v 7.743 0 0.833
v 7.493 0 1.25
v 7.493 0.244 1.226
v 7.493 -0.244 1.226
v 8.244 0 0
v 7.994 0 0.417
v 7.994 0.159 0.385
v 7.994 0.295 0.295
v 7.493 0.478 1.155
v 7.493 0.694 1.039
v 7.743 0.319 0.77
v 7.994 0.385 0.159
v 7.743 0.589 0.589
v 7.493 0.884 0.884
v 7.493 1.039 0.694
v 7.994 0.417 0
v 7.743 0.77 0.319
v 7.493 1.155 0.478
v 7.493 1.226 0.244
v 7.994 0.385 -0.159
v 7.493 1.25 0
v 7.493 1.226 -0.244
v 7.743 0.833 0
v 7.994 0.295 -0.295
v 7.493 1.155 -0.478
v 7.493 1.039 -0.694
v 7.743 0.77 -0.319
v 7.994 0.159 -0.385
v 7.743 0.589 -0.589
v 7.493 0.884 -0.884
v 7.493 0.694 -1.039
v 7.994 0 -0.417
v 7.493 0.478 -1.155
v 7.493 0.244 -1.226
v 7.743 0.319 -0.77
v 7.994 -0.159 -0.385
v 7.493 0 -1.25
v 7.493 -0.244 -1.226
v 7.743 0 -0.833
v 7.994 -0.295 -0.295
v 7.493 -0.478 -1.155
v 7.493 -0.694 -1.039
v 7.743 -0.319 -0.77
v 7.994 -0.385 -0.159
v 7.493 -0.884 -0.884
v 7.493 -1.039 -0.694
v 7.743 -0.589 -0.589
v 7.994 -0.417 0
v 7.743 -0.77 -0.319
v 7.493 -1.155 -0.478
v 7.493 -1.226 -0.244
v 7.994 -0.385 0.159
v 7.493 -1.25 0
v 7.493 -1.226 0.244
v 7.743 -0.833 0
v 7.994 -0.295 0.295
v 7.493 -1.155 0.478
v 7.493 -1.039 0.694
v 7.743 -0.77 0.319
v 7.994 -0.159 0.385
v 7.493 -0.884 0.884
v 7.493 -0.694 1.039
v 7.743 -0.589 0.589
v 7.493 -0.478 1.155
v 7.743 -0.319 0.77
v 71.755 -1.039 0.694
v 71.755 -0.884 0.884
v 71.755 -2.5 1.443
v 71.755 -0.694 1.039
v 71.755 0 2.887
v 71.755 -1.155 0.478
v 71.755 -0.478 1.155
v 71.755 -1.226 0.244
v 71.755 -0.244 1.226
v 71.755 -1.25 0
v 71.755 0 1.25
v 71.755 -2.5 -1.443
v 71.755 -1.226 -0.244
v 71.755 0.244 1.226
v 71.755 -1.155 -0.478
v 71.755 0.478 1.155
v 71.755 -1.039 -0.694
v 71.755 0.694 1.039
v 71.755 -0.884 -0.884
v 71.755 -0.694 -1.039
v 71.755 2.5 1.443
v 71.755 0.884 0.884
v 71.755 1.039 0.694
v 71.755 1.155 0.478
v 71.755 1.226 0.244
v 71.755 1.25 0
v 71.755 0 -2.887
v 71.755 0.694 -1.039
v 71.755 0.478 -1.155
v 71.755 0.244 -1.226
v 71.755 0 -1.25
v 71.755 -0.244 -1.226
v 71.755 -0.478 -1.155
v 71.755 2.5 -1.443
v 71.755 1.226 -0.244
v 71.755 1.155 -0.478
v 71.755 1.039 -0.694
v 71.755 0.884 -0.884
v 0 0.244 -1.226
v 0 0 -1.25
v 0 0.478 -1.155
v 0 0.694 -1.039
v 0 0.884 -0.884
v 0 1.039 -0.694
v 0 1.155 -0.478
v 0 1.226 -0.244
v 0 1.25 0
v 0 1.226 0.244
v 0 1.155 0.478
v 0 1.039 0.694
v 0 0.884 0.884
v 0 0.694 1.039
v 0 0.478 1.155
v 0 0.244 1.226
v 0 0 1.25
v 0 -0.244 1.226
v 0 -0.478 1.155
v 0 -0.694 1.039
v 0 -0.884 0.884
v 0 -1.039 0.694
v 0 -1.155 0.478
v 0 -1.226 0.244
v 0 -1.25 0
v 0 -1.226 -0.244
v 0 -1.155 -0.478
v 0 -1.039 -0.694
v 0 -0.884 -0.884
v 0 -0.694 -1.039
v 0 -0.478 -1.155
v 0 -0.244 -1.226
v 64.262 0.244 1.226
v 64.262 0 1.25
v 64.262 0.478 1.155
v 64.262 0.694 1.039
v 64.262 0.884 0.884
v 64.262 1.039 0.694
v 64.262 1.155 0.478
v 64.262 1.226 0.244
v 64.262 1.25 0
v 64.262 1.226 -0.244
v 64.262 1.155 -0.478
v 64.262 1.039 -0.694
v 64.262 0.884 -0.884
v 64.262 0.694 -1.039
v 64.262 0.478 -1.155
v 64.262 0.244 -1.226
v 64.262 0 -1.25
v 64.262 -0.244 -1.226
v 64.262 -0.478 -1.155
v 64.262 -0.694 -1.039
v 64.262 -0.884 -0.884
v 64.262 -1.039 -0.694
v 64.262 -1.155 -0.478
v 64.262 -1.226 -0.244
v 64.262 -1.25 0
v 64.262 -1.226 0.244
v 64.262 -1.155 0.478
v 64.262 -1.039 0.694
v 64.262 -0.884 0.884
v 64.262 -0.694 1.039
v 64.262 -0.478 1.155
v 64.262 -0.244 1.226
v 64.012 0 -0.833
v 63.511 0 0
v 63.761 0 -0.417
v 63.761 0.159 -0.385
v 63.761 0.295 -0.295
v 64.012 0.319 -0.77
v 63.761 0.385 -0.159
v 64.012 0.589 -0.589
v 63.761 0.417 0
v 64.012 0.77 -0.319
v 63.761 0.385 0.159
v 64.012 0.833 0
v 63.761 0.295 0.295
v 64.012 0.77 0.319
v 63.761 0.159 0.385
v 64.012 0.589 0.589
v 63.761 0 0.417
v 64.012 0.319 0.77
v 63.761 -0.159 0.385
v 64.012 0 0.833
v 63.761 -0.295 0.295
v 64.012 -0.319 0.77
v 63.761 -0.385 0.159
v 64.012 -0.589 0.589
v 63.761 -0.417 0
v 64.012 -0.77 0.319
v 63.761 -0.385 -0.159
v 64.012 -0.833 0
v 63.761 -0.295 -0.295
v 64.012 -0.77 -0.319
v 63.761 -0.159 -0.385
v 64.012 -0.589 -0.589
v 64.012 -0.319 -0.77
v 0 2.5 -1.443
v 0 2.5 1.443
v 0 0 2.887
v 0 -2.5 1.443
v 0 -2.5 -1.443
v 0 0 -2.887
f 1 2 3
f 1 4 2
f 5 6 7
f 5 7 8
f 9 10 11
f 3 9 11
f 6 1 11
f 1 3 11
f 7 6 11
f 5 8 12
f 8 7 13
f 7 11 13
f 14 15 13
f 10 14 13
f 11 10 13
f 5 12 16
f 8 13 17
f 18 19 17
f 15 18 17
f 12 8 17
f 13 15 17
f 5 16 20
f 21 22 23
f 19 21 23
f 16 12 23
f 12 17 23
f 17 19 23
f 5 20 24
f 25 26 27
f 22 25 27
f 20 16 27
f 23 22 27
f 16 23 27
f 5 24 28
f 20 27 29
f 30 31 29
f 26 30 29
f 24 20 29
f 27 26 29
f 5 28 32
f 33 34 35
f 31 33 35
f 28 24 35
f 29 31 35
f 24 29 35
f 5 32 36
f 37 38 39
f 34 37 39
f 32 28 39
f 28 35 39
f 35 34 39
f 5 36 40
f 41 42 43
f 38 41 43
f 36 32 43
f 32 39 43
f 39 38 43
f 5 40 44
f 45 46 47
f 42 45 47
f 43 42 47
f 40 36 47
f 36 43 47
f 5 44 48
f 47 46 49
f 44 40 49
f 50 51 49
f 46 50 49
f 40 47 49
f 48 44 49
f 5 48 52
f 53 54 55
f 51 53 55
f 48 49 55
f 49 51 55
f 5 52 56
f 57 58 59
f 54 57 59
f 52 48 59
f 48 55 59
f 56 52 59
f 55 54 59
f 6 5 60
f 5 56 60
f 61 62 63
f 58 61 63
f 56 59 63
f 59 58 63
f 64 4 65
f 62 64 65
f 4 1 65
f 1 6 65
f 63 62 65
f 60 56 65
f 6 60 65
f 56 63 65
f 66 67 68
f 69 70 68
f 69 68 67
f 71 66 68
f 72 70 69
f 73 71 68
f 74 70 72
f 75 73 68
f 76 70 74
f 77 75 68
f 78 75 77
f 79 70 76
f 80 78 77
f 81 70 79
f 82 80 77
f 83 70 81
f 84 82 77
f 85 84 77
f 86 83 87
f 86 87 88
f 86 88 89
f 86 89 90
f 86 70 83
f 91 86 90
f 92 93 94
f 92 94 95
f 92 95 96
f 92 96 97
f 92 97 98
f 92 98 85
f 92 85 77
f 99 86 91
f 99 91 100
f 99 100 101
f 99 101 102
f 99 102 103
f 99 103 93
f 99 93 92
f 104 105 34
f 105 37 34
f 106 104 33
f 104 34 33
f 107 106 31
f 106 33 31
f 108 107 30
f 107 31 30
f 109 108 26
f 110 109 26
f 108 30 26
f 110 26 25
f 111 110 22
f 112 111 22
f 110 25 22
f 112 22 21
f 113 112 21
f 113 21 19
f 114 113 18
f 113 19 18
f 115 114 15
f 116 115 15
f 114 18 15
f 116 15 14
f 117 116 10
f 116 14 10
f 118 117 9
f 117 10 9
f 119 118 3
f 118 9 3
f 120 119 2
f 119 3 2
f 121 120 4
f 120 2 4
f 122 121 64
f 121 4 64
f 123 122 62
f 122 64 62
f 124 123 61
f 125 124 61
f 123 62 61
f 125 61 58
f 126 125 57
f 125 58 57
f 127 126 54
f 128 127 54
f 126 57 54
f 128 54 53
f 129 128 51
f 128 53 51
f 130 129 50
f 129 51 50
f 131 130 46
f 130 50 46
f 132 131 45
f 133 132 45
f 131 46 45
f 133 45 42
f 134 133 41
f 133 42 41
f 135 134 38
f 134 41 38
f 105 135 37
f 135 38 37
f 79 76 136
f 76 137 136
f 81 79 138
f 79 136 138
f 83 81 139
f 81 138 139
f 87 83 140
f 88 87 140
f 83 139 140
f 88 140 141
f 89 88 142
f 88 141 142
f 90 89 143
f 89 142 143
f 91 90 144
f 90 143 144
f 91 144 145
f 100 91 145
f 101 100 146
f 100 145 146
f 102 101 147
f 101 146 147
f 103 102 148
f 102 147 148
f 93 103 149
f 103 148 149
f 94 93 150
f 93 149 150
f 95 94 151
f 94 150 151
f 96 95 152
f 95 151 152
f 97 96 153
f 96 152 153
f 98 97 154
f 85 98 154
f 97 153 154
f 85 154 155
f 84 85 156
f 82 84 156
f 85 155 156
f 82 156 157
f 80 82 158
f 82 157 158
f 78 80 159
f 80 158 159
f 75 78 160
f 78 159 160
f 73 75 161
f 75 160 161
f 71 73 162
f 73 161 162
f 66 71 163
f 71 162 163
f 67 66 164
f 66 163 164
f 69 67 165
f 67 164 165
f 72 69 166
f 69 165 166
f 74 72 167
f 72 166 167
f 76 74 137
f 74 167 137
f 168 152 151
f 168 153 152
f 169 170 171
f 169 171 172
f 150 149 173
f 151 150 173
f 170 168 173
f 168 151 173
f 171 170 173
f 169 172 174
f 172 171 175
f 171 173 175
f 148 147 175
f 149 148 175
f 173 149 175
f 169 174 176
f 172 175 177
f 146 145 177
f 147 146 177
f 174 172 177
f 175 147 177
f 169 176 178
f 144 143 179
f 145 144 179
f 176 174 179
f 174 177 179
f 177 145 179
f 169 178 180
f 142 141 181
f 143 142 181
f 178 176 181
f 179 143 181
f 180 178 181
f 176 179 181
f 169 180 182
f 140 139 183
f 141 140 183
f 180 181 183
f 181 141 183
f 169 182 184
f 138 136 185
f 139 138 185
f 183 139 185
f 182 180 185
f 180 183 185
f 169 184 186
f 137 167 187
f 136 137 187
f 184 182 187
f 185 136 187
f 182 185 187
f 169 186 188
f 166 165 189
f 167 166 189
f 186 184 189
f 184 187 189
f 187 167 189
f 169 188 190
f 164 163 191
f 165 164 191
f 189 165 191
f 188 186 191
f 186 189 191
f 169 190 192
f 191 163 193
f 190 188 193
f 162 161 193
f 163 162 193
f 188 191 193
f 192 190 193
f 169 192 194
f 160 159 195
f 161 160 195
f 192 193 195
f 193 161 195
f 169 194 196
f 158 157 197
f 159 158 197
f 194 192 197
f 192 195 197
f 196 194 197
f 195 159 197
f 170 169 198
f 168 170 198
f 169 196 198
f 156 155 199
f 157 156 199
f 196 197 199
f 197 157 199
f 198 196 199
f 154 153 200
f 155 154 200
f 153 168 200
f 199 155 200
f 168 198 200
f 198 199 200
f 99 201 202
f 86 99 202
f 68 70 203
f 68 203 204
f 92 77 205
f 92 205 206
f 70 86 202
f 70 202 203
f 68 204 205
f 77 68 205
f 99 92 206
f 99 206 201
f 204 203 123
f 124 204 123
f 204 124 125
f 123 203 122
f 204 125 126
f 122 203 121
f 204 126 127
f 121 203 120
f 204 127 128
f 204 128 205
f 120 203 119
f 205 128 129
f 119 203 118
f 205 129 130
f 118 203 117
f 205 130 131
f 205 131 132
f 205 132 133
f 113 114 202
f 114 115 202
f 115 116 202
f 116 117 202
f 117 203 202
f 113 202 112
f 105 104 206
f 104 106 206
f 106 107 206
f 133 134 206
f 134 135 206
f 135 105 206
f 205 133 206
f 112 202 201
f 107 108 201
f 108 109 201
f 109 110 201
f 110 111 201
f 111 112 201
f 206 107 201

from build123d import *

# Parameters (mm, degrees)
BOSS_EXTRUDE1_DEPTH       = 71.755
M3X0_5_TAPPED_HOLE1_D     = 2.5
M3X0_5_TAPPED_HOLE1_DEPTH = 7.493
M3X0_5_TAPPED_HOLE1_TIP   = 0.751075774
M3X0_5_TAPPED_HOLE2_D     = 2.5
M3X0_5_TAPPED_HOLE2_DEPTH = 7.493
M3X0_5_TAPPED_HOLE2_TIP   = 0.751075774


with BuildPart() as part:
    # Sketch1 → Boss-Extrude1 (new body)
    with BuildSketch(Plane(origin=(0, 0, 0), x_dir=(0, 0, -1), z_dir=(1, 0, 0))):
        Polygon((1.443375673, 2.5), (-1.443375673, 2.5), (-2.886751346, 0), (-1.443375673, -2.5), (1.443375673, -2.5), (2.886751346, 0), align=None)
    extrude(amount=BOSS_EXTRUDE1_DEPTH)

    # M3x0.5 Tapped Hole1
    with Locations(Plane.ZY):
        with Locations((0, 0)):
            Hole(M3X0_5_TAPPED_HOLE1_D / 2, depth=M3X0_5_TAPPED_HOLE1_DEPTH)
            with Locations((0, 0, -(M3X0_5_TAPPED_HOLE1_DEPTH + M3X0_5_TAPPED_HOLE1_TIP / 2))):  # 118° drill point
                Cone(0, M3X0_5_TAPPED_HOLE1_D / 2, M3X0_5_TAPPED_HOLE1_TIP, mode=Mode.SUBTRACT)

    # M3x0.5 Tapped Hole2
    with Locations(Plane(origin=(71.755, 0, 0), x_dir=(0, 0, -1), z_dir=(1, 0, 0))):
        with Locations((0, 0)):
            Hole(M3X0_5_TAPPED_HOLE2_D / 2, depth=M3X0_5_TAPPED_HOLE2_DEPTH)
            with Locations((0, 0, -(M3X0_5_TAPPED_HOLE2_DEPTH + M3X0_5_TAPPED_HOLE2_TIP / 2))):  # 118° drill point
                Cone(0, M3X0_5_TAPPED_HOLE2_D / 2, M3X0_5_TAPPED_HOLE2_TIP, mode=Mode.SUBTRACT)


solid = part.part
